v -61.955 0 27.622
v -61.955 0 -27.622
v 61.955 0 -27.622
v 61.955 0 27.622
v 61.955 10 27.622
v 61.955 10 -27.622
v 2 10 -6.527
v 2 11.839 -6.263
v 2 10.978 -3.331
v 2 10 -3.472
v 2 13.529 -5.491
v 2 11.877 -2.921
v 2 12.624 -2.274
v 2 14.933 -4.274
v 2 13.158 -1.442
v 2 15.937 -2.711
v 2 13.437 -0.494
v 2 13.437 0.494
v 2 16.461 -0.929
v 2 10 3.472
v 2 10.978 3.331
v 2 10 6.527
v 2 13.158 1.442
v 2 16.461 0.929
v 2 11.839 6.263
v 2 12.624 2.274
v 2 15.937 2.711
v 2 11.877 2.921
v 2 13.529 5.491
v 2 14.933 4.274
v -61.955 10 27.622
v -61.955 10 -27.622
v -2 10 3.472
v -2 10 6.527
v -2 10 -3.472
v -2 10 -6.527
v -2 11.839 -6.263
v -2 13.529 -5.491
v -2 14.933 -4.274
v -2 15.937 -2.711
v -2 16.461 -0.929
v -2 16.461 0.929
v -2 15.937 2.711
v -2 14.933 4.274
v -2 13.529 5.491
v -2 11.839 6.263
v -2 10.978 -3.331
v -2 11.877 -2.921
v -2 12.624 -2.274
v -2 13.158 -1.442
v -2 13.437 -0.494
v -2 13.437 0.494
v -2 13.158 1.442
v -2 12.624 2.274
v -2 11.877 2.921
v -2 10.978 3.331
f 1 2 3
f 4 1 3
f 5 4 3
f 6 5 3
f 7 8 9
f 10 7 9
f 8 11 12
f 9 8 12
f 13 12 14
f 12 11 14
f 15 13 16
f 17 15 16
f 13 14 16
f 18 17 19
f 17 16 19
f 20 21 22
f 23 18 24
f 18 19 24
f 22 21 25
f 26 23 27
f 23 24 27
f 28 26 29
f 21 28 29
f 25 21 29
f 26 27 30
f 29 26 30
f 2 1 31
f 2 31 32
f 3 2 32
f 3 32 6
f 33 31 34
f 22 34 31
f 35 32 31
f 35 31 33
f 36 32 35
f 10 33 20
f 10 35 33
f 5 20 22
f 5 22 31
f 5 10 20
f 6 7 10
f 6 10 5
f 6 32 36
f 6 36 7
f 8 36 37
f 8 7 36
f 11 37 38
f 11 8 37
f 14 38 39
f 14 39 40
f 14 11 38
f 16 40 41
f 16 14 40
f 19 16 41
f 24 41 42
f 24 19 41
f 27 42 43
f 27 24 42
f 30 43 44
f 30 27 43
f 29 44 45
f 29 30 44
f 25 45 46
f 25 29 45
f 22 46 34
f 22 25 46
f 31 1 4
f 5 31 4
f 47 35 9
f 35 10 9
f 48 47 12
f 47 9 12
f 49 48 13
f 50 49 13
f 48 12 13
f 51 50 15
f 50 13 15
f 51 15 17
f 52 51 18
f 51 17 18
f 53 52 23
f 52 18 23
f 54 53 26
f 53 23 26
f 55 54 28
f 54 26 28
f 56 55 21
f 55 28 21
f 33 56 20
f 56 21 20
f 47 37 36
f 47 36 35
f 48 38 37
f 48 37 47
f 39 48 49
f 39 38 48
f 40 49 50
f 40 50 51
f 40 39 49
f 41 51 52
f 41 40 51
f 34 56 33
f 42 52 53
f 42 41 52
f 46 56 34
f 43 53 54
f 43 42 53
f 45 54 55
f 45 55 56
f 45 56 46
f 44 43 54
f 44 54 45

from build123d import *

# Parameters (mm, degrees)
SKETCH2_W           = 123.909820238
SKETCH2_H           = 55.24312819
BOSS_EXTRUDE2_DEPTH = 10
SKETCH3_W           = 4
SKETCH3_H           = 3.05525832
REVOLVE4_ANGLE      = 180


with BuildPart() as part:
    # Sketch2 → Boss-Extrude2 (new body)
    with BuildSketch(Plane(origin=(0, 0, 0), x_dir=(1, 0, 0), z_dir=(0, 1, 0))):
        Rectangle(SKETCH2_W, SKETCH2_H)
    extrude(amount=BOSS_EXTRUDE2_DEPTH)

    # Sketch3 → Revolve4 (revolve)
    with BuildSketch(Plane(origin=(0, 10, 0), x_dir=(1, 0, 0), z_dir=(0, 1, 0))):
        with Locations((0, 4.999513614)):
            Rectangle(SKETCH3_W, SKETCH3_H)
    revolve(axis=Axis((-61.954910119, 10, 0), (1, 0, 0)), revolution_arc=REVOLVE4_ANGLE)


solid = part.part
